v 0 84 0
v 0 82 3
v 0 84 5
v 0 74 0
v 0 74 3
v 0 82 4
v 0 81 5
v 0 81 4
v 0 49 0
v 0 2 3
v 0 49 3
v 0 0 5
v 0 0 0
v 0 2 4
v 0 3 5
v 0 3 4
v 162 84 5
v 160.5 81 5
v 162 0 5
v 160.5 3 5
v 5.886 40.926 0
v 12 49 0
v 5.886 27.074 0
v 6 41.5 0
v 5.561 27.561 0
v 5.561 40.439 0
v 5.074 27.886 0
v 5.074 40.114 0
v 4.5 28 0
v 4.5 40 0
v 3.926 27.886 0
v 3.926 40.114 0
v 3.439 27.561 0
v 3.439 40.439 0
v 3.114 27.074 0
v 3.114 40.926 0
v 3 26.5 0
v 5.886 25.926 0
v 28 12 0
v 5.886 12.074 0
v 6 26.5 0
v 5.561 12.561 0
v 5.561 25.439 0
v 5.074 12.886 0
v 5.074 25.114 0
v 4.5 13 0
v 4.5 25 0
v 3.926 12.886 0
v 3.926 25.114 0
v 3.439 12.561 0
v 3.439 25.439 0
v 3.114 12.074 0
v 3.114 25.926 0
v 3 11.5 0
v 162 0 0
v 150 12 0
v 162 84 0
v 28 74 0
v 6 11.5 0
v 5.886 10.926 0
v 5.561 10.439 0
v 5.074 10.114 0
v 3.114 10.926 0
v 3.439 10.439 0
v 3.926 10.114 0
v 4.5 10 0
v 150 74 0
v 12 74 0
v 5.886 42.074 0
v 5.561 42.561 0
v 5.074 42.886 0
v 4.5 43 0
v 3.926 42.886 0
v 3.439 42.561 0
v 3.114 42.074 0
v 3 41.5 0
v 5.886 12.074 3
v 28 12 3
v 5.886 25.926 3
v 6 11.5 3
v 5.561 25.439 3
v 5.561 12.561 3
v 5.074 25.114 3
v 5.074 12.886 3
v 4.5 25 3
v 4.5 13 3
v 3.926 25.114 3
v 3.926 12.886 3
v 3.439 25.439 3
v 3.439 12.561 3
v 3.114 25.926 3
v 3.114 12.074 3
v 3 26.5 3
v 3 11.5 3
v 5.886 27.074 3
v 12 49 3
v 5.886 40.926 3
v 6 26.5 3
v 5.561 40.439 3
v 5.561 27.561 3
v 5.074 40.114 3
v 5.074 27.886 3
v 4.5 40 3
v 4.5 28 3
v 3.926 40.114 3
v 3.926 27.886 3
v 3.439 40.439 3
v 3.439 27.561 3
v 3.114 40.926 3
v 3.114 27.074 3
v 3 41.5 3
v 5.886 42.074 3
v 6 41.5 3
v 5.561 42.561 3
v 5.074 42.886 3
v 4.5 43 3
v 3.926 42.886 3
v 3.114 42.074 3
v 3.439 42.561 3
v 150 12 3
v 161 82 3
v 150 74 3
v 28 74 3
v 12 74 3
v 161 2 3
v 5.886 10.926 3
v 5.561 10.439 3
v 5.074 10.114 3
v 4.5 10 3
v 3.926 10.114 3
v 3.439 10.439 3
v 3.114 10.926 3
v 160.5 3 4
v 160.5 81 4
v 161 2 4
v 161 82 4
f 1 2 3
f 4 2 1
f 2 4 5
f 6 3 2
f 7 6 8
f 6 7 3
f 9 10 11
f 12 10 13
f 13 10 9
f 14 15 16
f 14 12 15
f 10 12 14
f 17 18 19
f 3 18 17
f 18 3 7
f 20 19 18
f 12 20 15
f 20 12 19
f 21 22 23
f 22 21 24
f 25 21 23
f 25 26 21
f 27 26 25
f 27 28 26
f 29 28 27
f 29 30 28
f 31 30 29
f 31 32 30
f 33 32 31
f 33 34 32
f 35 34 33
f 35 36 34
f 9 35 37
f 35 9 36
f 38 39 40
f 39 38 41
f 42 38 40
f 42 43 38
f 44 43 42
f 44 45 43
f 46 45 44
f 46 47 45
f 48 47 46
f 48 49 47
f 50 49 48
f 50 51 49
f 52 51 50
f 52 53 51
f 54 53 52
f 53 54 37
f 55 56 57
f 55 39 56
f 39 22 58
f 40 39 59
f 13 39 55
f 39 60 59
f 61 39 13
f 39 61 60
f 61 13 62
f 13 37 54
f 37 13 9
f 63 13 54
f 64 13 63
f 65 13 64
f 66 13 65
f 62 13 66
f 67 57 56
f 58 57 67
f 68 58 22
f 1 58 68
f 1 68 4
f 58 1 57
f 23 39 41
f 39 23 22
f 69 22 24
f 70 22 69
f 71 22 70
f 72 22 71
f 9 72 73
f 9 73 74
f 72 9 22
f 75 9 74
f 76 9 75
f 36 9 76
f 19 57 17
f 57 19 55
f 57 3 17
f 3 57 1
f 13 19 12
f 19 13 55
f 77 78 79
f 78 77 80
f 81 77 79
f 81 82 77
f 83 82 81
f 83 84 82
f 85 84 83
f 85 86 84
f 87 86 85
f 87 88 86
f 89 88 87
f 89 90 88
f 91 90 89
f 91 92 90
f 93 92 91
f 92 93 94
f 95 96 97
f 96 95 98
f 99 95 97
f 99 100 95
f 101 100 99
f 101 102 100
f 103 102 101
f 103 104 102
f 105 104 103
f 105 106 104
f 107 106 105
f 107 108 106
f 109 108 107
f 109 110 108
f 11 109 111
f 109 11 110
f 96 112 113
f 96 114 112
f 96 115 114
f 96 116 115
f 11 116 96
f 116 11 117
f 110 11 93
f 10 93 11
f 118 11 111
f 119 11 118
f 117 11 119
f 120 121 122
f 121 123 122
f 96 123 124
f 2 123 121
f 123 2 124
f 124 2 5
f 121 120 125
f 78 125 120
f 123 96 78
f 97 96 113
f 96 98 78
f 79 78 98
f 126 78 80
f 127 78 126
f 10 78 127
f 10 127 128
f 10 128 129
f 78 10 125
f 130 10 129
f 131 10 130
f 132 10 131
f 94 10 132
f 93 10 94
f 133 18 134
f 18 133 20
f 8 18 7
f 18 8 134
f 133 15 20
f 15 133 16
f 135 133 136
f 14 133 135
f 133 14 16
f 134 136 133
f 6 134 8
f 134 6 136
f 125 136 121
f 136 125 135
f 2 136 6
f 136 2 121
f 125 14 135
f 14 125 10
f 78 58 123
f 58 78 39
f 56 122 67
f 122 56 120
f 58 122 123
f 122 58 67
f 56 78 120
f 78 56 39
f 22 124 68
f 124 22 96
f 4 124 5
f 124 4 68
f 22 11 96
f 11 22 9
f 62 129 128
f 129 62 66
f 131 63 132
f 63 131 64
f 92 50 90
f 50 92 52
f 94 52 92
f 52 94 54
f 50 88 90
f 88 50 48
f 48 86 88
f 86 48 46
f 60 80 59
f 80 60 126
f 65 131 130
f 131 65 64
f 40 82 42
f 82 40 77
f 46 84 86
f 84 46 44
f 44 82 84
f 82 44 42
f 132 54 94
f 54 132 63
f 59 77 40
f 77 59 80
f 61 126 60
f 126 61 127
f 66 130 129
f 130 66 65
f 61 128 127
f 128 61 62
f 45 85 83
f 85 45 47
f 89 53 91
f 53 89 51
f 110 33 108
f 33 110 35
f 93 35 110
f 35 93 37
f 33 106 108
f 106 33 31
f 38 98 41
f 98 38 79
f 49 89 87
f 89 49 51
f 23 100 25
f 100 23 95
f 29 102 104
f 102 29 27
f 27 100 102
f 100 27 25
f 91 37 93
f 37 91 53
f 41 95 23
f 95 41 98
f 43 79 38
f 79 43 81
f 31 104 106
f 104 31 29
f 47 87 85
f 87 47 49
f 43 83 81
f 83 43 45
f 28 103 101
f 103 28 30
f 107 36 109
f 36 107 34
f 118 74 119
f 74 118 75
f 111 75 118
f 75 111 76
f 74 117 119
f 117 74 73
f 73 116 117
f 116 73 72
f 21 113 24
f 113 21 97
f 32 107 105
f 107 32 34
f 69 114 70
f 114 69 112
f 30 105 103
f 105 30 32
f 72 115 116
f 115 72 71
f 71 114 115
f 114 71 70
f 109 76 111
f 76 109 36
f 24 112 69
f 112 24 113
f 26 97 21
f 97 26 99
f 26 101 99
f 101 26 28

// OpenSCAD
// MIT License
//
// Copyright (c) 2022 David Lawson
//
// Permission is hereby granted, free of charge, to any person obtaining a copy
// of this software and associated documentation files (the "Software"), to deal
// in the Software without restriction, including without limitation the rights
// to use, copy, modify, merge, publish, distribute, sublicense, and/or sell
// copies of the Software, and to permit persons to whom the Software is
// furnished to do so, subject to the following conditions:
//
// The above copyright notice and this permission notice shall be included in all
// copies or substantial portions of the Software.
//
// THE SOFTWARE IS PROVIDED "AS IS", WITHOUT WARRANTY OF ANY KIND, EXPRESS OR
// IMPLIED, INCLUDING BUT NOT LIMITED TO THE WARRANTIES OF MERCHANTABILITY,
// FITNESS FOR A PARTICULAR PURPOSE AND NONINFRINGEMENT. IN NO EVENT SHALL THE
// AUTHORS OR COPYRIGHT HOLDERS BE LIABLE FOR ANY CLAIM, DAMAGES OR OTHER
// LIABILITY, WHETHER IN AN ACTION OF CONTRACT, TORT OR OTHERWISE, ARISING FROM,
// OUT OF OR IN CONNECTION WITH THE SOFTWARE OR THE USE OR OTHER DEALINGS IN THE
// SOFTWARE.

translate([162,0,0])
mirror(v=[1,0,0])
difference() {
    translate([81,42,2.5])
    cube([162,84,5], center=true);
    
    translate([3,3,3])
    translate([79,39,1.5]) cube([161,78,3], center=true);
    
    translate([2,2,3])
    translate([80,40,.5]) cube([162,80,1], center=true);
    
    translate([12,12,-.5])
    translate([61,31,2.5]) cube([122,62,5], center=true);

    translate([150,49,-.5])
    translate([7.5,12.5,2.5]) cube([15,25,5], center=true);
    
    $fn=16;
    translate([156, 10, 0])
        translate([1.5,1.5,-1]) cylinder(r=1.5,h=10);
    translate([156, 10, 0])
        translate([0,15,0])
        translate([1.5,1.5,-1]) cylinder(r=1.5,h=10);
    translate([156, 10, 0])
        translate([0,30,0])
        translate([1.5,1.5,-1]) cylinder(r=1.5,h=10);      
 }
